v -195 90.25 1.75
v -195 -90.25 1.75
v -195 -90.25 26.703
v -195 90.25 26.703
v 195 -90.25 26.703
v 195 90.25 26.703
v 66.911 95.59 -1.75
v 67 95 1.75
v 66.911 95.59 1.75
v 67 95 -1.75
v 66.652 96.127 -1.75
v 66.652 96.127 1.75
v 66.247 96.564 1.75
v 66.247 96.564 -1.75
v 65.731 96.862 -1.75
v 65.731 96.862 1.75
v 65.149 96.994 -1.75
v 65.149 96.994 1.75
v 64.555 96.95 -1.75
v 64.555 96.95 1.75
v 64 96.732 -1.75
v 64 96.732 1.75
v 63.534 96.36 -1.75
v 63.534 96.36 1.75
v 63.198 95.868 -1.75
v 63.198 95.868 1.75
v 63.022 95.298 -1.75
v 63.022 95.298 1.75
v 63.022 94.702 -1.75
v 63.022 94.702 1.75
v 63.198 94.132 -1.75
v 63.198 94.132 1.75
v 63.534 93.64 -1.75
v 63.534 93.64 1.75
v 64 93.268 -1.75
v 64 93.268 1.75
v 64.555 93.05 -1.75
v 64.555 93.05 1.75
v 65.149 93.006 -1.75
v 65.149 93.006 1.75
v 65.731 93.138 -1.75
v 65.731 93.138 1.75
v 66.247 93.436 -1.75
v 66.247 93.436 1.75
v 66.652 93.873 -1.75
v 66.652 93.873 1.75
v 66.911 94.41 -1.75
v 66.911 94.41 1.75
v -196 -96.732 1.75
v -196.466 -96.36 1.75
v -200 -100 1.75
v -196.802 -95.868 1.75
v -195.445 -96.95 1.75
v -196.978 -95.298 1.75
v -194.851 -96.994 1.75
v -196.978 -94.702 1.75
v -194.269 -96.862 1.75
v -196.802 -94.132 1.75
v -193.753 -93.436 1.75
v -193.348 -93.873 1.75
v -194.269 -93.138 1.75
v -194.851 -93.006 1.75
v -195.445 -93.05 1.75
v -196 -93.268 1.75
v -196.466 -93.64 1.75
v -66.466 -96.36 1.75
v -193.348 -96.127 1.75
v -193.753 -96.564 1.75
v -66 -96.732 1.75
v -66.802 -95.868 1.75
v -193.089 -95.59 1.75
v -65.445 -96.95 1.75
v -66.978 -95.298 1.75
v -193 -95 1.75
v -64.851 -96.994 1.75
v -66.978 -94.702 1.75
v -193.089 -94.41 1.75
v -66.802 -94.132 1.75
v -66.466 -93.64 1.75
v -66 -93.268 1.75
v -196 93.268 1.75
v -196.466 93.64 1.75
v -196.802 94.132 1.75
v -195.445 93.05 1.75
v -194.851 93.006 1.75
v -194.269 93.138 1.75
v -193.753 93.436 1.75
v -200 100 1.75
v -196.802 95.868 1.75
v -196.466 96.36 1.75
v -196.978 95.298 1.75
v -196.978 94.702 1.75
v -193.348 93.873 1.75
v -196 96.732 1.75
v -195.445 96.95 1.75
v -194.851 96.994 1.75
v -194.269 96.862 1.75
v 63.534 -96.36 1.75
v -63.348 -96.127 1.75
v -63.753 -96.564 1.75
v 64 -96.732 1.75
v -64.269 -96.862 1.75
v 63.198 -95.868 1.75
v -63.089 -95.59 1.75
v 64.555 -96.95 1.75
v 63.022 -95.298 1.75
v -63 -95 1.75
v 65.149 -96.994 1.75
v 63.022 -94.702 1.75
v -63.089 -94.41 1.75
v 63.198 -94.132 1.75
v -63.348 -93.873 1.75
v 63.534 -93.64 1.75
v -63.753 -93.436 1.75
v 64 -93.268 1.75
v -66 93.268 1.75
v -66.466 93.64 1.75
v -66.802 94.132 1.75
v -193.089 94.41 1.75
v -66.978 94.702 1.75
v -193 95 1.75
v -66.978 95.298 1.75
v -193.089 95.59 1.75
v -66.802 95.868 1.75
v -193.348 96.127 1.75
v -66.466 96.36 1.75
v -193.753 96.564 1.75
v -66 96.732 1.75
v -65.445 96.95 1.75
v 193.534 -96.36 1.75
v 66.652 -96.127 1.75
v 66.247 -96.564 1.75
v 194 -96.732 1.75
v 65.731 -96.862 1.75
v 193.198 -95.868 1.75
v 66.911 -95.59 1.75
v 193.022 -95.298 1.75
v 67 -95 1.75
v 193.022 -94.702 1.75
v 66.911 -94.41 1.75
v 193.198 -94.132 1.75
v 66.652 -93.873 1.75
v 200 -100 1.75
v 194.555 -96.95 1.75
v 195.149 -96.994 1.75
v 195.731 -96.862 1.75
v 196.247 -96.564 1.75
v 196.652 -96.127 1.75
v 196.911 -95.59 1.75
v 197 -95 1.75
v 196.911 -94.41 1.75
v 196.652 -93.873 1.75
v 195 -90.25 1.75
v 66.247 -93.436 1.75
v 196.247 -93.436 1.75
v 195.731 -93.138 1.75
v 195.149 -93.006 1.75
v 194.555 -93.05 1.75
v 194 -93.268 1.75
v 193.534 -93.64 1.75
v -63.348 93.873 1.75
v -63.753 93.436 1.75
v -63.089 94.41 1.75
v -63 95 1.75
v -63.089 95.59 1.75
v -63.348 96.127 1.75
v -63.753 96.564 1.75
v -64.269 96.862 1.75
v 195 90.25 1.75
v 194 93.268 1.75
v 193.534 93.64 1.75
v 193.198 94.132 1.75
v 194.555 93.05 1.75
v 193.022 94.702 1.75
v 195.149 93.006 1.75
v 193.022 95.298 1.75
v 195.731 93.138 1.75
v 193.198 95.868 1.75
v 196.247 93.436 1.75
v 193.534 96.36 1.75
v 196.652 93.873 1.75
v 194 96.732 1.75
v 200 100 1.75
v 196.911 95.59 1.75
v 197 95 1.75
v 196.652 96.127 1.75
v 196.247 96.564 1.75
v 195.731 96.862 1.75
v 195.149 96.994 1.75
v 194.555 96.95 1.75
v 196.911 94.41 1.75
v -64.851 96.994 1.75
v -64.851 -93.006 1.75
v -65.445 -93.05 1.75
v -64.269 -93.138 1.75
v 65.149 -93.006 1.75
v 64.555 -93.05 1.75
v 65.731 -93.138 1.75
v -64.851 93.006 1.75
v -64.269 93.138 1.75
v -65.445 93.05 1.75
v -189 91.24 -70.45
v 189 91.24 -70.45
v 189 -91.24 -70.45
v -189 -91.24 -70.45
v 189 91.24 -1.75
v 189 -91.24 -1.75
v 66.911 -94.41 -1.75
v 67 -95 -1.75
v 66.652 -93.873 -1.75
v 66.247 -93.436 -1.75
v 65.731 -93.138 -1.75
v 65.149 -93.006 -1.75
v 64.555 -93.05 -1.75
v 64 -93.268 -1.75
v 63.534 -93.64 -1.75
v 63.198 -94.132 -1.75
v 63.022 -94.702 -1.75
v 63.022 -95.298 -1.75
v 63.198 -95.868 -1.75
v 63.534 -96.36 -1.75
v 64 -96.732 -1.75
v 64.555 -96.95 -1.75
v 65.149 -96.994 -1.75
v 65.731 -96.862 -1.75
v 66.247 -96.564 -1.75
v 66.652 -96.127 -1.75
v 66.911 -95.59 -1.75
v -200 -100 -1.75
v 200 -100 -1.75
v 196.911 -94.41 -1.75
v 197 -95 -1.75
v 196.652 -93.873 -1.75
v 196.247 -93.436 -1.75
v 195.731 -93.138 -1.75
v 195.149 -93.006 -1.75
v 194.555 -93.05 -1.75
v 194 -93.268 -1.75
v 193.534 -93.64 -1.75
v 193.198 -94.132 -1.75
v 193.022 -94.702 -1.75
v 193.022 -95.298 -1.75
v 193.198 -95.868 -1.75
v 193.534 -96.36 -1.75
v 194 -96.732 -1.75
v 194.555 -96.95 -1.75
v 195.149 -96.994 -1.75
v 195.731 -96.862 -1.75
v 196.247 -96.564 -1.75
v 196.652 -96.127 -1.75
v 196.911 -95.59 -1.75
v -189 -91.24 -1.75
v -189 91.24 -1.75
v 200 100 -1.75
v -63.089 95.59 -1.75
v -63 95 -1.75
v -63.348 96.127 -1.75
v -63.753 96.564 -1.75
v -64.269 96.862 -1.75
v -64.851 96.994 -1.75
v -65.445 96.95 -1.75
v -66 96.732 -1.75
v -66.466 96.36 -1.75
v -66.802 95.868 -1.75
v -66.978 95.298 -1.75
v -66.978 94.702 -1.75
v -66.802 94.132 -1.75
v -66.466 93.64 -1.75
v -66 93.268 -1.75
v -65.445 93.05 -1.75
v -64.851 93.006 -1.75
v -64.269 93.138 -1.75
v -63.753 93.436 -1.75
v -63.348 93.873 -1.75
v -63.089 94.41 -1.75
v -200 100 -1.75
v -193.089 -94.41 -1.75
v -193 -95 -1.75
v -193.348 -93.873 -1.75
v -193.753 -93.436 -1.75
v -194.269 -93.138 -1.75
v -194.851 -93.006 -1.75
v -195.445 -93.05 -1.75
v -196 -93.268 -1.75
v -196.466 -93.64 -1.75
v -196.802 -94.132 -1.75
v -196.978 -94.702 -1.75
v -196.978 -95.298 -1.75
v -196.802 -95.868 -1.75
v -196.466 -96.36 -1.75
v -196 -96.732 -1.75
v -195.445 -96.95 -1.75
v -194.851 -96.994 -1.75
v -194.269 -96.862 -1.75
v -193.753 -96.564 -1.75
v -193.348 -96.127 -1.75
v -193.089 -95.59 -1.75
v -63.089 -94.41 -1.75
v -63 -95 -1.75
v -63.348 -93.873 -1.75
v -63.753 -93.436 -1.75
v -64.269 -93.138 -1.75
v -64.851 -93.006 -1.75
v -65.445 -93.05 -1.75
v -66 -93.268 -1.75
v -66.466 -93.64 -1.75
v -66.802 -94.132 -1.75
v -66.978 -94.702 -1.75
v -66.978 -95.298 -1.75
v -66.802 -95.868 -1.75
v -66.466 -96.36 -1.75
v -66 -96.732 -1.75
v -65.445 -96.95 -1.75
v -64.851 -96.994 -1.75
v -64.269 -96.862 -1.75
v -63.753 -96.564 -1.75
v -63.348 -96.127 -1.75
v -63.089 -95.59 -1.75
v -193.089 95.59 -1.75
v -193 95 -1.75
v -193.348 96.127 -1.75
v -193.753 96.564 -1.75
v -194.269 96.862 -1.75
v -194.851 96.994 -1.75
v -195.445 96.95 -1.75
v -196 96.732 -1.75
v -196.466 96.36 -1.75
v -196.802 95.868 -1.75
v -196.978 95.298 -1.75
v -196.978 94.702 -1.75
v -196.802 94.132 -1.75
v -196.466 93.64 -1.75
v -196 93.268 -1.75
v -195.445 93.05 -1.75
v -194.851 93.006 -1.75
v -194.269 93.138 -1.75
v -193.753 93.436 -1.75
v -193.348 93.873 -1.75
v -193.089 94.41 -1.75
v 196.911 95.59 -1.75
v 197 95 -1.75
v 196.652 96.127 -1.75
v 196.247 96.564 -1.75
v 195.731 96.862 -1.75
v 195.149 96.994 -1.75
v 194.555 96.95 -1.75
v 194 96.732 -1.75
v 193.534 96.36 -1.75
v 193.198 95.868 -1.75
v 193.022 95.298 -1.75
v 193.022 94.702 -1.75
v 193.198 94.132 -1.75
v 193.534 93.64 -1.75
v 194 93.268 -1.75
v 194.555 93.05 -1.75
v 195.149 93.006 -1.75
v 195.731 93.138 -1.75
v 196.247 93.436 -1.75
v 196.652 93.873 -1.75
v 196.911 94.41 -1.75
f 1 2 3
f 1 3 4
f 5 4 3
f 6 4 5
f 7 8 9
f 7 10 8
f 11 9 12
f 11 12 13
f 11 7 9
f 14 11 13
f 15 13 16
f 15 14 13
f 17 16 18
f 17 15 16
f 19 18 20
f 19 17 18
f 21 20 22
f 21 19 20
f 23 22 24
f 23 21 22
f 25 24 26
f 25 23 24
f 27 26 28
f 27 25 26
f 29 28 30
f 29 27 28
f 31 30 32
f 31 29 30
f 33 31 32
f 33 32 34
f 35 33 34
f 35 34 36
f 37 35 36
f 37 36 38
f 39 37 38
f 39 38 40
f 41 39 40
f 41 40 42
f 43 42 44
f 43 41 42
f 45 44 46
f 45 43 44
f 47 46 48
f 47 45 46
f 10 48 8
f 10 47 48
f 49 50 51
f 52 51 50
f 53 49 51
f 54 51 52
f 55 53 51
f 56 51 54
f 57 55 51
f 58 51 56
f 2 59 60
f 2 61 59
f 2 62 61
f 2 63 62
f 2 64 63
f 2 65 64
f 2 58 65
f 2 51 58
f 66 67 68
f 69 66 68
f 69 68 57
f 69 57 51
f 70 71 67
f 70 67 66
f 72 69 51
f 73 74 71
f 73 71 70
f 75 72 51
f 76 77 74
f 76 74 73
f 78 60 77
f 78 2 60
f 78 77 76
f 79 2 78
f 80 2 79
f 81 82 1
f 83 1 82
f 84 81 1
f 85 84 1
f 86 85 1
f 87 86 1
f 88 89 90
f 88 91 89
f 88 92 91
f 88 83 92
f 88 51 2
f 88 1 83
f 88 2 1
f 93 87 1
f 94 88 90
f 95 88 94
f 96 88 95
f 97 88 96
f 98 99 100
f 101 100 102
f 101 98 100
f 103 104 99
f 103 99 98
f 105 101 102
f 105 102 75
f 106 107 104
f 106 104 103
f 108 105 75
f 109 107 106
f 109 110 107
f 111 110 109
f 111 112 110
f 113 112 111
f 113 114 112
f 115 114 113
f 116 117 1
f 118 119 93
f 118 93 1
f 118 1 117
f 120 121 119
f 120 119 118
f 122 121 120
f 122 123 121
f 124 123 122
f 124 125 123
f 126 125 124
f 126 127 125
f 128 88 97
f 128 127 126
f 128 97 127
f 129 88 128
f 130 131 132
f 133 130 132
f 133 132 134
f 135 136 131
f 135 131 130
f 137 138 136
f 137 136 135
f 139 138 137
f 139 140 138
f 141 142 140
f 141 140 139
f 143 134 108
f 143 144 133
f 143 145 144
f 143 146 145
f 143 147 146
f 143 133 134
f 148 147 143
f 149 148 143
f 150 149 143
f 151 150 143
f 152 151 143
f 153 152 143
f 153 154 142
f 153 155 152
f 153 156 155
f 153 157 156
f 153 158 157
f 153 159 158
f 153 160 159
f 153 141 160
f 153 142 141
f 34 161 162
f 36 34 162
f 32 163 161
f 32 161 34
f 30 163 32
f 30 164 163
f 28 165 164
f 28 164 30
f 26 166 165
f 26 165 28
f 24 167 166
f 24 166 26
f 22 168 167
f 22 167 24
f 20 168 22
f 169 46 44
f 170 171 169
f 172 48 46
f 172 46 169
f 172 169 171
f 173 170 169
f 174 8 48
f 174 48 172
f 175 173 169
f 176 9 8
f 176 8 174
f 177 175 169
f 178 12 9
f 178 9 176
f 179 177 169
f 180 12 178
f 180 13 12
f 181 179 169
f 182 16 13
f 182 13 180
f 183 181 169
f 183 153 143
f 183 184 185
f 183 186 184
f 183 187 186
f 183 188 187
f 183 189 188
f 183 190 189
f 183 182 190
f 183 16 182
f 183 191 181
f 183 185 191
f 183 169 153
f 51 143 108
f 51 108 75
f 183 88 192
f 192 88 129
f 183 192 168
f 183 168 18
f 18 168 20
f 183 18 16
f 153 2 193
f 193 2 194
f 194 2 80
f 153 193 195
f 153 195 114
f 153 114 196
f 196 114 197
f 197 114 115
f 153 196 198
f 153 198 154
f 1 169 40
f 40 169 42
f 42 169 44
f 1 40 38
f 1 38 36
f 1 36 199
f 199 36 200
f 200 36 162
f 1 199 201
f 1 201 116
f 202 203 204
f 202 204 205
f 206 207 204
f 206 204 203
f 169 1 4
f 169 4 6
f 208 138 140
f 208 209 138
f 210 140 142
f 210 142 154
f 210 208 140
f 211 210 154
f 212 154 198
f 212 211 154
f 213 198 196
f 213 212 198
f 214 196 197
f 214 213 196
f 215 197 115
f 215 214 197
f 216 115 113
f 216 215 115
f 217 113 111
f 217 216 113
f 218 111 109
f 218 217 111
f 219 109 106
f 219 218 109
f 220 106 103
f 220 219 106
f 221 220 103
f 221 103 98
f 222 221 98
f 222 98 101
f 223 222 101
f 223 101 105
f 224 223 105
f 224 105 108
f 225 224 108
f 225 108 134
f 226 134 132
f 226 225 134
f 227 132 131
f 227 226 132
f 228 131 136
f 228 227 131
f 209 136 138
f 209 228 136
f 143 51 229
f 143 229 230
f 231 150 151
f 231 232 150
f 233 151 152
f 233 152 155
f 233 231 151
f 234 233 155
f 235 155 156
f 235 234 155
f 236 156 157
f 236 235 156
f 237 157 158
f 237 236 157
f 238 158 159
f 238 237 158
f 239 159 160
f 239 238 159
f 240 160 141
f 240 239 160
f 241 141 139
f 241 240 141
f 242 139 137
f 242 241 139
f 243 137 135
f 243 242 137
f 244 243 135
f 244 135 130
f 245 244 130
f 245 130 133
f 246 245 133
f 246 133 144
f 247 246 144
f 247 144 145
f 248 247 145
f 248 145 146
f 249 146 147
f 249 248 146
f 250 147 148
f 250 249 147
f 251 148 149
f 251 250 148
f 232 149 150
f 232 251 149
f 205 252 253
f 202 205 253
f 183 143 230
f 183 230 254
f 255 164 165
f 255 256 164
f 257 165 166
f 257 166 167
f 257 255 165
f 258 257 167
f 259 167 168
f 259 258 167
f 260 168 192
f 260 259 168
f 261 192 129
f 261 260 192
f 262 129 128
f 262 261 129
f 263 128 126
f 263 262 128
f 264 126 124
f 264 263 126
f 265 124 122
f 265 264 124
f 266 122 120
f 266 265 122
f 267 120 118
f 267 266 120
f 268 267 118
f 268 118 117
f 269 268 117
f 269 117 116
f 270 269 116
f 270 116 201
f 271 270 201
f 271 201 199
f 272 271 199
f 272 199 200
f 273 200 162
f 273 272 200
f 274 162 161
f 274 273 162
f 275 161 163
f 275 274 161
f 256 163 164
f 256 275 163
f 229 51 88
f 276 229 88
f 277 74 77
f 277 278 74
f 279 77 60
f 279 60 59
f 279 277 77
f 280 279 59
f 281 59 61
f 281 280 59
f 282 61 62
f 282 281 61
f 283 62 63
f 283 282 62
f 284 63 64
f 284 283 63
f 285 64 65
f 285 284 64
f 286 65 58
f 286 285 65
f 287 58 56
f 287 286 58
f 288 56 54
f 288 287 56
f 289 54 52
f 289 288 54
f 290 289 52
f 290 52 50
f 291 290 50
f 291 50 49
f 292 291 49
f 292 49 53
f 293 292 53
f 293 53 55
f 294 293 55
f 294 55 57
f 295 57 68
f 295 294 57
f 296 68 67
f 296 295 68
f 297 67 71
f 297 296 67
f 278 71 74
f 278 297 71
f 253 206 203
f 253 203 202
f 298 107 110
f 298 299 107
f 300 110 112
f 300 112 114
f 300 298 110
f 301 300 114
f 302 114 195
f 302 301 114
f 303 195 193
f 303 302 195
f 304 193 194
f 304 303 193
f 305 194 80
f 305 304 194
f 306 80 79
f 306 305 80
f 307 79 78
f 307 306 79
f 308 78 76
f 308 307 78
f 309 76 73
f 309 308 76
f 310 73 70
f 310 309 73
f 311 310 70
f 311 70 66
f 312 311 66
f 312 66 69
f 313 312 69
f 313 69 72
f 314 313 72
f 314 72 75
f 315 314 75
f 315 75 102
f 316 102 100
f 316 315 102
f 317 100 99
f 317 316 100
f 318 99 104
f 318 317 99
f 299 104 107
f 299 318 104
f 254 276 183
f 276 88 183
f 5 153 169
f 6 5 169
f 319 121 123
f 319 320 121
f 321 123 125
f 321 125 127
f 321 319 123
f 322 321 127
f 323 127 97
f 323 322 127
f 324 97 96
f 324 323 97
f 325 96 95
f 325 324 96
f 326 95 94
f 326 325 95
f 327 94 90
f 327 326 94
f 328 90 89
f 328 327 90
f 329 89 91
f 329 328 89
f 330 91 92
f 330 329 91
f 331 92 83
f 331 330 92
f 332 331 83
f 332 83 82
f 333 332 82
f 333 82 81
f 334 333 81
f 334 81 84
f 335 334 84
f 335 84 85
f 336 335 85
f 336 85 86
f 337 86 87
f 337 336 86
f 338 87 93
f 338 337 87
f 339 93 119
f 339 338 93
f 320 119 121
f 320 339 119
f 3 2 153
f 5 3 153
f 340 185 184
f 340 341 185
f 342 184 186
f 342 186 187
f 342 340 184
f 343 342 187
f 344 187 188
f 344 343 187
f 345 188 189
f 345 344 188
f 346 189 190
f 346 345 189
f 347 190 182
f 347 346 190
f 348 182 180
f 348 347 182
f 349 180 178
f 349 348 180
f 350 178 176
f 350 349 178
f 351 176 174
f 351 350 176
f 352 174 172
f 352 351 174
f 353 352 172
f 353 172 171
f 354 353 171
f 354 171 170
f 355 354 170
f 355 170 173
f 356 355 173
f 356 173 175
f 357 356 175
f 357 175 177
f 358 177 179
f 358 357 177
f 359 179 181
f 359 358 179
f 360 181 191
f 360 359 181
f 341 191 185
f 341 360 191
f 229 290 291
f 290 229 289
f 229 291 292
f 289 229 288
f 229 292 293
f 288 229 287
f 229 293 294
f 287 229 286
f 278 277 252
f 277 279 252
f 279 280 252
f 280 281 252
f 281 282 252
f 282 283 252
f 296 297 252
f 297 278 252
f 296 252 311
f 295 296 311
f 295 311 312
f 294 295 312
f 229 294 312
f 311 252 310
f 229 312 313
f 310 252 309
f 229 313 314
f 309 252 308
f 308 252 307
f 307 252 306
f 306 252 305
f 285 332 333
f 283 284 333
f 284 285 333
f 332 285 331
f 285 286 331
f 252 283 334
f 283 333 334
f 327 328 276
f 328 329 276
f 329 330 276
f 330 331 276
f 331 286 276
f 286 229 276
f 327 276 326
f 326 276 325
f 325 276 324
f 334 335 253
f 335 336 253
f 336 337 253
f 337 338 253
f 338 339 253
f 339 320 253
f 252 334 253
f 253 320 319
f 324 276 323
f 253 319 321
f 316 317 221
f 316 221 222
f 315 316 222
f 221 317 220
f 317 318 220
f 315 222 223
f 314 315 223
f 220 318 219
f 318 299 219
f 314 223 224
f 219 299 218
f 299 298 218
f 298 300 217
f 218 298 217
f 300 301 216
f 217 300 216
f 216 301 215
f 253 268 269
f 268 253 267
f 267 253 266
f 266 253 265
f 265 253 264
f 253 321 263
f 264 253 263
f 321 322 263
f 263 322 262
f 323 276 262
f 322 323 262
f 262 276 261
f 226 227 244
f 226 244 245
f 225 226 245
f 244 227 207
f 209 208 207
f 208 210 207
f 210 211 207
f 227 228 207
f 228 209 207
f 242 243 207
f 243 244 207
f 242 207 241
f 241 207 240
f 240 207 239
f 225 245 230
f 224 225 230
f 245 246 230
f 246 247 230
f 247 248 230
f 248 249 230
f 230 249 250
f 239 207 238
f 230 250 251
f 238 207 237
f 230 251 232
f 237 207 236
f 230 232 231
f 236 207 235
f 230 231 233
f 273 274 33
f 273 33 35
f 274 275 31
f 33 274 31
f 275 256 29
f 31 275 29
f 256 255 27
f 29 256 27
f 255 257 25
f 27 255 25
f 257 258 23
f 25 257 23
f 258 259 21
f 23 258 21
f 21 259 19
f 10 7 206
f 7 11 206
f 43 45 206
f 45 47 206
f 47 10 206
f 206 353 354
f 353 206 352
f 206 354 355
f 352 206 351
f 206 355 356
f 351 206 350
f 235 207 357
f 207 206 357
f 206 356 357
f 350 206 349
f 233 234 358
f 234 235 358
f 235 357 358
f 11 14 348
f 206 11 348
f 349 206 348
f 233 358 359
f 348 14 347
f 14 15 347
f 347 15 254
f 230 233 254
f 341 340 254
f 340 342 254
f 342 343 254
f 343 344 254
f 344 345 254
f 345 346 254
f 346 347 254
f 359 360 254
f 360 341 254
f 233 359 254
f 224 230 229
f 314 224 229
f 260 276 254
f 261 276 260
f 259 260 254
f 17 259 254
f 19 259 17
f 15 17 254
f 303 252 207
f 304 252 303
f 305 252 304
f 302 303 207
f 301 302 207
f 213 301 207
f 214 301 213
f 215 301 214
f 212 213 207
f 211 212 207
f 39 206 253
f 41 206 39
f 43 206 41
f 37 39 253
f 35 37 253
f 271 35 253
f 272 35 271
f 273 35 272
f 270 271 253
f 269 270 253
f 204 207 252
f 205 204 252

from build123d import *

# Parameters (mm, degrees)
IZIM1_W                     = 400
IZIM1_H                     = 200
IZIM1_R                     = 2
Y_KSEKLIK_EKSTR_ZYON1_DEPTH = 1.75
IZIM2_W                     = 390
IZIM2_H                     = 180.5
Y_KSEKLIK_EKSTR_ZYON2_DEPTH = 24.953
IZIM4_W                     = 378
IZIM4_H                     = 182.48
Y_KSEKLIK_EKSTR_ZYON4_DEPTH = 68.7


with BuildPart() as part:
    # Çizim1 → Yükseklik-Ekstrüzyon1 (new, symmetric)
    with BuildSketch(Plane.XY):
        Rectangle(IZIM1_W, IZIM1_H)
        with Locations((-195, 95)):
            Circle(IZIM1_R, mode=Mode.SUBTRACT)
        with Locations((-65, 95)):
            Circle(IZIM1_R, mode=Mode.SUBTRACT)
        with Locations((65, 95)):
            Circle(IZIM1_R, mode=Mode.SUBTRACT)
        with Locations((195, 95)):
            Circle(IZIM1_R, mode=Mode.SUBTRACT)
        with Locations((-65, -95)):
            Circle(IZIM1_R, mode=Mode.SUBTRACT)
        with Locations((65, -95)):
            Circle(IZIM1_R, mode=Mode.SUBTRACT)
        with Locations((195, -95)):
            Circle(IZIM1_R, mode=Mode.SUBTRACT)
        with Locations((-195, -95)):
            Circle(IZIM1_R, mode=Mode.SUBTRACT)
    extrude(amount=Y_KSEKLIK_EKSTR_ZYON1_DEPTH, both=True)

    # Çizim2 → Yükseklik-Ekstrüzyon2 (add)
    with BuildSketch(Plane.XY.offset(1.75)):
        Rectangle(IZIM2_W, IZIM2_H)
    extrude(amount=Y_KSEKLIK_EKSTR_ZYON2_DEPTH)

    # Çizim4 → Yükseklik-Ekstrüzyon4 (add)
    with BuildSketch(Plane(origin=(0, 0, -1.75), x_dir=(-1, 0, 0), z_dir=(0, 0, -1))):
        Rectangle(IZIM4_W, IZIM4_H)
    extrude(amount=Y_KSEKLIK_EKSTR_ZYON4_DEPTH)


solid = part.part
